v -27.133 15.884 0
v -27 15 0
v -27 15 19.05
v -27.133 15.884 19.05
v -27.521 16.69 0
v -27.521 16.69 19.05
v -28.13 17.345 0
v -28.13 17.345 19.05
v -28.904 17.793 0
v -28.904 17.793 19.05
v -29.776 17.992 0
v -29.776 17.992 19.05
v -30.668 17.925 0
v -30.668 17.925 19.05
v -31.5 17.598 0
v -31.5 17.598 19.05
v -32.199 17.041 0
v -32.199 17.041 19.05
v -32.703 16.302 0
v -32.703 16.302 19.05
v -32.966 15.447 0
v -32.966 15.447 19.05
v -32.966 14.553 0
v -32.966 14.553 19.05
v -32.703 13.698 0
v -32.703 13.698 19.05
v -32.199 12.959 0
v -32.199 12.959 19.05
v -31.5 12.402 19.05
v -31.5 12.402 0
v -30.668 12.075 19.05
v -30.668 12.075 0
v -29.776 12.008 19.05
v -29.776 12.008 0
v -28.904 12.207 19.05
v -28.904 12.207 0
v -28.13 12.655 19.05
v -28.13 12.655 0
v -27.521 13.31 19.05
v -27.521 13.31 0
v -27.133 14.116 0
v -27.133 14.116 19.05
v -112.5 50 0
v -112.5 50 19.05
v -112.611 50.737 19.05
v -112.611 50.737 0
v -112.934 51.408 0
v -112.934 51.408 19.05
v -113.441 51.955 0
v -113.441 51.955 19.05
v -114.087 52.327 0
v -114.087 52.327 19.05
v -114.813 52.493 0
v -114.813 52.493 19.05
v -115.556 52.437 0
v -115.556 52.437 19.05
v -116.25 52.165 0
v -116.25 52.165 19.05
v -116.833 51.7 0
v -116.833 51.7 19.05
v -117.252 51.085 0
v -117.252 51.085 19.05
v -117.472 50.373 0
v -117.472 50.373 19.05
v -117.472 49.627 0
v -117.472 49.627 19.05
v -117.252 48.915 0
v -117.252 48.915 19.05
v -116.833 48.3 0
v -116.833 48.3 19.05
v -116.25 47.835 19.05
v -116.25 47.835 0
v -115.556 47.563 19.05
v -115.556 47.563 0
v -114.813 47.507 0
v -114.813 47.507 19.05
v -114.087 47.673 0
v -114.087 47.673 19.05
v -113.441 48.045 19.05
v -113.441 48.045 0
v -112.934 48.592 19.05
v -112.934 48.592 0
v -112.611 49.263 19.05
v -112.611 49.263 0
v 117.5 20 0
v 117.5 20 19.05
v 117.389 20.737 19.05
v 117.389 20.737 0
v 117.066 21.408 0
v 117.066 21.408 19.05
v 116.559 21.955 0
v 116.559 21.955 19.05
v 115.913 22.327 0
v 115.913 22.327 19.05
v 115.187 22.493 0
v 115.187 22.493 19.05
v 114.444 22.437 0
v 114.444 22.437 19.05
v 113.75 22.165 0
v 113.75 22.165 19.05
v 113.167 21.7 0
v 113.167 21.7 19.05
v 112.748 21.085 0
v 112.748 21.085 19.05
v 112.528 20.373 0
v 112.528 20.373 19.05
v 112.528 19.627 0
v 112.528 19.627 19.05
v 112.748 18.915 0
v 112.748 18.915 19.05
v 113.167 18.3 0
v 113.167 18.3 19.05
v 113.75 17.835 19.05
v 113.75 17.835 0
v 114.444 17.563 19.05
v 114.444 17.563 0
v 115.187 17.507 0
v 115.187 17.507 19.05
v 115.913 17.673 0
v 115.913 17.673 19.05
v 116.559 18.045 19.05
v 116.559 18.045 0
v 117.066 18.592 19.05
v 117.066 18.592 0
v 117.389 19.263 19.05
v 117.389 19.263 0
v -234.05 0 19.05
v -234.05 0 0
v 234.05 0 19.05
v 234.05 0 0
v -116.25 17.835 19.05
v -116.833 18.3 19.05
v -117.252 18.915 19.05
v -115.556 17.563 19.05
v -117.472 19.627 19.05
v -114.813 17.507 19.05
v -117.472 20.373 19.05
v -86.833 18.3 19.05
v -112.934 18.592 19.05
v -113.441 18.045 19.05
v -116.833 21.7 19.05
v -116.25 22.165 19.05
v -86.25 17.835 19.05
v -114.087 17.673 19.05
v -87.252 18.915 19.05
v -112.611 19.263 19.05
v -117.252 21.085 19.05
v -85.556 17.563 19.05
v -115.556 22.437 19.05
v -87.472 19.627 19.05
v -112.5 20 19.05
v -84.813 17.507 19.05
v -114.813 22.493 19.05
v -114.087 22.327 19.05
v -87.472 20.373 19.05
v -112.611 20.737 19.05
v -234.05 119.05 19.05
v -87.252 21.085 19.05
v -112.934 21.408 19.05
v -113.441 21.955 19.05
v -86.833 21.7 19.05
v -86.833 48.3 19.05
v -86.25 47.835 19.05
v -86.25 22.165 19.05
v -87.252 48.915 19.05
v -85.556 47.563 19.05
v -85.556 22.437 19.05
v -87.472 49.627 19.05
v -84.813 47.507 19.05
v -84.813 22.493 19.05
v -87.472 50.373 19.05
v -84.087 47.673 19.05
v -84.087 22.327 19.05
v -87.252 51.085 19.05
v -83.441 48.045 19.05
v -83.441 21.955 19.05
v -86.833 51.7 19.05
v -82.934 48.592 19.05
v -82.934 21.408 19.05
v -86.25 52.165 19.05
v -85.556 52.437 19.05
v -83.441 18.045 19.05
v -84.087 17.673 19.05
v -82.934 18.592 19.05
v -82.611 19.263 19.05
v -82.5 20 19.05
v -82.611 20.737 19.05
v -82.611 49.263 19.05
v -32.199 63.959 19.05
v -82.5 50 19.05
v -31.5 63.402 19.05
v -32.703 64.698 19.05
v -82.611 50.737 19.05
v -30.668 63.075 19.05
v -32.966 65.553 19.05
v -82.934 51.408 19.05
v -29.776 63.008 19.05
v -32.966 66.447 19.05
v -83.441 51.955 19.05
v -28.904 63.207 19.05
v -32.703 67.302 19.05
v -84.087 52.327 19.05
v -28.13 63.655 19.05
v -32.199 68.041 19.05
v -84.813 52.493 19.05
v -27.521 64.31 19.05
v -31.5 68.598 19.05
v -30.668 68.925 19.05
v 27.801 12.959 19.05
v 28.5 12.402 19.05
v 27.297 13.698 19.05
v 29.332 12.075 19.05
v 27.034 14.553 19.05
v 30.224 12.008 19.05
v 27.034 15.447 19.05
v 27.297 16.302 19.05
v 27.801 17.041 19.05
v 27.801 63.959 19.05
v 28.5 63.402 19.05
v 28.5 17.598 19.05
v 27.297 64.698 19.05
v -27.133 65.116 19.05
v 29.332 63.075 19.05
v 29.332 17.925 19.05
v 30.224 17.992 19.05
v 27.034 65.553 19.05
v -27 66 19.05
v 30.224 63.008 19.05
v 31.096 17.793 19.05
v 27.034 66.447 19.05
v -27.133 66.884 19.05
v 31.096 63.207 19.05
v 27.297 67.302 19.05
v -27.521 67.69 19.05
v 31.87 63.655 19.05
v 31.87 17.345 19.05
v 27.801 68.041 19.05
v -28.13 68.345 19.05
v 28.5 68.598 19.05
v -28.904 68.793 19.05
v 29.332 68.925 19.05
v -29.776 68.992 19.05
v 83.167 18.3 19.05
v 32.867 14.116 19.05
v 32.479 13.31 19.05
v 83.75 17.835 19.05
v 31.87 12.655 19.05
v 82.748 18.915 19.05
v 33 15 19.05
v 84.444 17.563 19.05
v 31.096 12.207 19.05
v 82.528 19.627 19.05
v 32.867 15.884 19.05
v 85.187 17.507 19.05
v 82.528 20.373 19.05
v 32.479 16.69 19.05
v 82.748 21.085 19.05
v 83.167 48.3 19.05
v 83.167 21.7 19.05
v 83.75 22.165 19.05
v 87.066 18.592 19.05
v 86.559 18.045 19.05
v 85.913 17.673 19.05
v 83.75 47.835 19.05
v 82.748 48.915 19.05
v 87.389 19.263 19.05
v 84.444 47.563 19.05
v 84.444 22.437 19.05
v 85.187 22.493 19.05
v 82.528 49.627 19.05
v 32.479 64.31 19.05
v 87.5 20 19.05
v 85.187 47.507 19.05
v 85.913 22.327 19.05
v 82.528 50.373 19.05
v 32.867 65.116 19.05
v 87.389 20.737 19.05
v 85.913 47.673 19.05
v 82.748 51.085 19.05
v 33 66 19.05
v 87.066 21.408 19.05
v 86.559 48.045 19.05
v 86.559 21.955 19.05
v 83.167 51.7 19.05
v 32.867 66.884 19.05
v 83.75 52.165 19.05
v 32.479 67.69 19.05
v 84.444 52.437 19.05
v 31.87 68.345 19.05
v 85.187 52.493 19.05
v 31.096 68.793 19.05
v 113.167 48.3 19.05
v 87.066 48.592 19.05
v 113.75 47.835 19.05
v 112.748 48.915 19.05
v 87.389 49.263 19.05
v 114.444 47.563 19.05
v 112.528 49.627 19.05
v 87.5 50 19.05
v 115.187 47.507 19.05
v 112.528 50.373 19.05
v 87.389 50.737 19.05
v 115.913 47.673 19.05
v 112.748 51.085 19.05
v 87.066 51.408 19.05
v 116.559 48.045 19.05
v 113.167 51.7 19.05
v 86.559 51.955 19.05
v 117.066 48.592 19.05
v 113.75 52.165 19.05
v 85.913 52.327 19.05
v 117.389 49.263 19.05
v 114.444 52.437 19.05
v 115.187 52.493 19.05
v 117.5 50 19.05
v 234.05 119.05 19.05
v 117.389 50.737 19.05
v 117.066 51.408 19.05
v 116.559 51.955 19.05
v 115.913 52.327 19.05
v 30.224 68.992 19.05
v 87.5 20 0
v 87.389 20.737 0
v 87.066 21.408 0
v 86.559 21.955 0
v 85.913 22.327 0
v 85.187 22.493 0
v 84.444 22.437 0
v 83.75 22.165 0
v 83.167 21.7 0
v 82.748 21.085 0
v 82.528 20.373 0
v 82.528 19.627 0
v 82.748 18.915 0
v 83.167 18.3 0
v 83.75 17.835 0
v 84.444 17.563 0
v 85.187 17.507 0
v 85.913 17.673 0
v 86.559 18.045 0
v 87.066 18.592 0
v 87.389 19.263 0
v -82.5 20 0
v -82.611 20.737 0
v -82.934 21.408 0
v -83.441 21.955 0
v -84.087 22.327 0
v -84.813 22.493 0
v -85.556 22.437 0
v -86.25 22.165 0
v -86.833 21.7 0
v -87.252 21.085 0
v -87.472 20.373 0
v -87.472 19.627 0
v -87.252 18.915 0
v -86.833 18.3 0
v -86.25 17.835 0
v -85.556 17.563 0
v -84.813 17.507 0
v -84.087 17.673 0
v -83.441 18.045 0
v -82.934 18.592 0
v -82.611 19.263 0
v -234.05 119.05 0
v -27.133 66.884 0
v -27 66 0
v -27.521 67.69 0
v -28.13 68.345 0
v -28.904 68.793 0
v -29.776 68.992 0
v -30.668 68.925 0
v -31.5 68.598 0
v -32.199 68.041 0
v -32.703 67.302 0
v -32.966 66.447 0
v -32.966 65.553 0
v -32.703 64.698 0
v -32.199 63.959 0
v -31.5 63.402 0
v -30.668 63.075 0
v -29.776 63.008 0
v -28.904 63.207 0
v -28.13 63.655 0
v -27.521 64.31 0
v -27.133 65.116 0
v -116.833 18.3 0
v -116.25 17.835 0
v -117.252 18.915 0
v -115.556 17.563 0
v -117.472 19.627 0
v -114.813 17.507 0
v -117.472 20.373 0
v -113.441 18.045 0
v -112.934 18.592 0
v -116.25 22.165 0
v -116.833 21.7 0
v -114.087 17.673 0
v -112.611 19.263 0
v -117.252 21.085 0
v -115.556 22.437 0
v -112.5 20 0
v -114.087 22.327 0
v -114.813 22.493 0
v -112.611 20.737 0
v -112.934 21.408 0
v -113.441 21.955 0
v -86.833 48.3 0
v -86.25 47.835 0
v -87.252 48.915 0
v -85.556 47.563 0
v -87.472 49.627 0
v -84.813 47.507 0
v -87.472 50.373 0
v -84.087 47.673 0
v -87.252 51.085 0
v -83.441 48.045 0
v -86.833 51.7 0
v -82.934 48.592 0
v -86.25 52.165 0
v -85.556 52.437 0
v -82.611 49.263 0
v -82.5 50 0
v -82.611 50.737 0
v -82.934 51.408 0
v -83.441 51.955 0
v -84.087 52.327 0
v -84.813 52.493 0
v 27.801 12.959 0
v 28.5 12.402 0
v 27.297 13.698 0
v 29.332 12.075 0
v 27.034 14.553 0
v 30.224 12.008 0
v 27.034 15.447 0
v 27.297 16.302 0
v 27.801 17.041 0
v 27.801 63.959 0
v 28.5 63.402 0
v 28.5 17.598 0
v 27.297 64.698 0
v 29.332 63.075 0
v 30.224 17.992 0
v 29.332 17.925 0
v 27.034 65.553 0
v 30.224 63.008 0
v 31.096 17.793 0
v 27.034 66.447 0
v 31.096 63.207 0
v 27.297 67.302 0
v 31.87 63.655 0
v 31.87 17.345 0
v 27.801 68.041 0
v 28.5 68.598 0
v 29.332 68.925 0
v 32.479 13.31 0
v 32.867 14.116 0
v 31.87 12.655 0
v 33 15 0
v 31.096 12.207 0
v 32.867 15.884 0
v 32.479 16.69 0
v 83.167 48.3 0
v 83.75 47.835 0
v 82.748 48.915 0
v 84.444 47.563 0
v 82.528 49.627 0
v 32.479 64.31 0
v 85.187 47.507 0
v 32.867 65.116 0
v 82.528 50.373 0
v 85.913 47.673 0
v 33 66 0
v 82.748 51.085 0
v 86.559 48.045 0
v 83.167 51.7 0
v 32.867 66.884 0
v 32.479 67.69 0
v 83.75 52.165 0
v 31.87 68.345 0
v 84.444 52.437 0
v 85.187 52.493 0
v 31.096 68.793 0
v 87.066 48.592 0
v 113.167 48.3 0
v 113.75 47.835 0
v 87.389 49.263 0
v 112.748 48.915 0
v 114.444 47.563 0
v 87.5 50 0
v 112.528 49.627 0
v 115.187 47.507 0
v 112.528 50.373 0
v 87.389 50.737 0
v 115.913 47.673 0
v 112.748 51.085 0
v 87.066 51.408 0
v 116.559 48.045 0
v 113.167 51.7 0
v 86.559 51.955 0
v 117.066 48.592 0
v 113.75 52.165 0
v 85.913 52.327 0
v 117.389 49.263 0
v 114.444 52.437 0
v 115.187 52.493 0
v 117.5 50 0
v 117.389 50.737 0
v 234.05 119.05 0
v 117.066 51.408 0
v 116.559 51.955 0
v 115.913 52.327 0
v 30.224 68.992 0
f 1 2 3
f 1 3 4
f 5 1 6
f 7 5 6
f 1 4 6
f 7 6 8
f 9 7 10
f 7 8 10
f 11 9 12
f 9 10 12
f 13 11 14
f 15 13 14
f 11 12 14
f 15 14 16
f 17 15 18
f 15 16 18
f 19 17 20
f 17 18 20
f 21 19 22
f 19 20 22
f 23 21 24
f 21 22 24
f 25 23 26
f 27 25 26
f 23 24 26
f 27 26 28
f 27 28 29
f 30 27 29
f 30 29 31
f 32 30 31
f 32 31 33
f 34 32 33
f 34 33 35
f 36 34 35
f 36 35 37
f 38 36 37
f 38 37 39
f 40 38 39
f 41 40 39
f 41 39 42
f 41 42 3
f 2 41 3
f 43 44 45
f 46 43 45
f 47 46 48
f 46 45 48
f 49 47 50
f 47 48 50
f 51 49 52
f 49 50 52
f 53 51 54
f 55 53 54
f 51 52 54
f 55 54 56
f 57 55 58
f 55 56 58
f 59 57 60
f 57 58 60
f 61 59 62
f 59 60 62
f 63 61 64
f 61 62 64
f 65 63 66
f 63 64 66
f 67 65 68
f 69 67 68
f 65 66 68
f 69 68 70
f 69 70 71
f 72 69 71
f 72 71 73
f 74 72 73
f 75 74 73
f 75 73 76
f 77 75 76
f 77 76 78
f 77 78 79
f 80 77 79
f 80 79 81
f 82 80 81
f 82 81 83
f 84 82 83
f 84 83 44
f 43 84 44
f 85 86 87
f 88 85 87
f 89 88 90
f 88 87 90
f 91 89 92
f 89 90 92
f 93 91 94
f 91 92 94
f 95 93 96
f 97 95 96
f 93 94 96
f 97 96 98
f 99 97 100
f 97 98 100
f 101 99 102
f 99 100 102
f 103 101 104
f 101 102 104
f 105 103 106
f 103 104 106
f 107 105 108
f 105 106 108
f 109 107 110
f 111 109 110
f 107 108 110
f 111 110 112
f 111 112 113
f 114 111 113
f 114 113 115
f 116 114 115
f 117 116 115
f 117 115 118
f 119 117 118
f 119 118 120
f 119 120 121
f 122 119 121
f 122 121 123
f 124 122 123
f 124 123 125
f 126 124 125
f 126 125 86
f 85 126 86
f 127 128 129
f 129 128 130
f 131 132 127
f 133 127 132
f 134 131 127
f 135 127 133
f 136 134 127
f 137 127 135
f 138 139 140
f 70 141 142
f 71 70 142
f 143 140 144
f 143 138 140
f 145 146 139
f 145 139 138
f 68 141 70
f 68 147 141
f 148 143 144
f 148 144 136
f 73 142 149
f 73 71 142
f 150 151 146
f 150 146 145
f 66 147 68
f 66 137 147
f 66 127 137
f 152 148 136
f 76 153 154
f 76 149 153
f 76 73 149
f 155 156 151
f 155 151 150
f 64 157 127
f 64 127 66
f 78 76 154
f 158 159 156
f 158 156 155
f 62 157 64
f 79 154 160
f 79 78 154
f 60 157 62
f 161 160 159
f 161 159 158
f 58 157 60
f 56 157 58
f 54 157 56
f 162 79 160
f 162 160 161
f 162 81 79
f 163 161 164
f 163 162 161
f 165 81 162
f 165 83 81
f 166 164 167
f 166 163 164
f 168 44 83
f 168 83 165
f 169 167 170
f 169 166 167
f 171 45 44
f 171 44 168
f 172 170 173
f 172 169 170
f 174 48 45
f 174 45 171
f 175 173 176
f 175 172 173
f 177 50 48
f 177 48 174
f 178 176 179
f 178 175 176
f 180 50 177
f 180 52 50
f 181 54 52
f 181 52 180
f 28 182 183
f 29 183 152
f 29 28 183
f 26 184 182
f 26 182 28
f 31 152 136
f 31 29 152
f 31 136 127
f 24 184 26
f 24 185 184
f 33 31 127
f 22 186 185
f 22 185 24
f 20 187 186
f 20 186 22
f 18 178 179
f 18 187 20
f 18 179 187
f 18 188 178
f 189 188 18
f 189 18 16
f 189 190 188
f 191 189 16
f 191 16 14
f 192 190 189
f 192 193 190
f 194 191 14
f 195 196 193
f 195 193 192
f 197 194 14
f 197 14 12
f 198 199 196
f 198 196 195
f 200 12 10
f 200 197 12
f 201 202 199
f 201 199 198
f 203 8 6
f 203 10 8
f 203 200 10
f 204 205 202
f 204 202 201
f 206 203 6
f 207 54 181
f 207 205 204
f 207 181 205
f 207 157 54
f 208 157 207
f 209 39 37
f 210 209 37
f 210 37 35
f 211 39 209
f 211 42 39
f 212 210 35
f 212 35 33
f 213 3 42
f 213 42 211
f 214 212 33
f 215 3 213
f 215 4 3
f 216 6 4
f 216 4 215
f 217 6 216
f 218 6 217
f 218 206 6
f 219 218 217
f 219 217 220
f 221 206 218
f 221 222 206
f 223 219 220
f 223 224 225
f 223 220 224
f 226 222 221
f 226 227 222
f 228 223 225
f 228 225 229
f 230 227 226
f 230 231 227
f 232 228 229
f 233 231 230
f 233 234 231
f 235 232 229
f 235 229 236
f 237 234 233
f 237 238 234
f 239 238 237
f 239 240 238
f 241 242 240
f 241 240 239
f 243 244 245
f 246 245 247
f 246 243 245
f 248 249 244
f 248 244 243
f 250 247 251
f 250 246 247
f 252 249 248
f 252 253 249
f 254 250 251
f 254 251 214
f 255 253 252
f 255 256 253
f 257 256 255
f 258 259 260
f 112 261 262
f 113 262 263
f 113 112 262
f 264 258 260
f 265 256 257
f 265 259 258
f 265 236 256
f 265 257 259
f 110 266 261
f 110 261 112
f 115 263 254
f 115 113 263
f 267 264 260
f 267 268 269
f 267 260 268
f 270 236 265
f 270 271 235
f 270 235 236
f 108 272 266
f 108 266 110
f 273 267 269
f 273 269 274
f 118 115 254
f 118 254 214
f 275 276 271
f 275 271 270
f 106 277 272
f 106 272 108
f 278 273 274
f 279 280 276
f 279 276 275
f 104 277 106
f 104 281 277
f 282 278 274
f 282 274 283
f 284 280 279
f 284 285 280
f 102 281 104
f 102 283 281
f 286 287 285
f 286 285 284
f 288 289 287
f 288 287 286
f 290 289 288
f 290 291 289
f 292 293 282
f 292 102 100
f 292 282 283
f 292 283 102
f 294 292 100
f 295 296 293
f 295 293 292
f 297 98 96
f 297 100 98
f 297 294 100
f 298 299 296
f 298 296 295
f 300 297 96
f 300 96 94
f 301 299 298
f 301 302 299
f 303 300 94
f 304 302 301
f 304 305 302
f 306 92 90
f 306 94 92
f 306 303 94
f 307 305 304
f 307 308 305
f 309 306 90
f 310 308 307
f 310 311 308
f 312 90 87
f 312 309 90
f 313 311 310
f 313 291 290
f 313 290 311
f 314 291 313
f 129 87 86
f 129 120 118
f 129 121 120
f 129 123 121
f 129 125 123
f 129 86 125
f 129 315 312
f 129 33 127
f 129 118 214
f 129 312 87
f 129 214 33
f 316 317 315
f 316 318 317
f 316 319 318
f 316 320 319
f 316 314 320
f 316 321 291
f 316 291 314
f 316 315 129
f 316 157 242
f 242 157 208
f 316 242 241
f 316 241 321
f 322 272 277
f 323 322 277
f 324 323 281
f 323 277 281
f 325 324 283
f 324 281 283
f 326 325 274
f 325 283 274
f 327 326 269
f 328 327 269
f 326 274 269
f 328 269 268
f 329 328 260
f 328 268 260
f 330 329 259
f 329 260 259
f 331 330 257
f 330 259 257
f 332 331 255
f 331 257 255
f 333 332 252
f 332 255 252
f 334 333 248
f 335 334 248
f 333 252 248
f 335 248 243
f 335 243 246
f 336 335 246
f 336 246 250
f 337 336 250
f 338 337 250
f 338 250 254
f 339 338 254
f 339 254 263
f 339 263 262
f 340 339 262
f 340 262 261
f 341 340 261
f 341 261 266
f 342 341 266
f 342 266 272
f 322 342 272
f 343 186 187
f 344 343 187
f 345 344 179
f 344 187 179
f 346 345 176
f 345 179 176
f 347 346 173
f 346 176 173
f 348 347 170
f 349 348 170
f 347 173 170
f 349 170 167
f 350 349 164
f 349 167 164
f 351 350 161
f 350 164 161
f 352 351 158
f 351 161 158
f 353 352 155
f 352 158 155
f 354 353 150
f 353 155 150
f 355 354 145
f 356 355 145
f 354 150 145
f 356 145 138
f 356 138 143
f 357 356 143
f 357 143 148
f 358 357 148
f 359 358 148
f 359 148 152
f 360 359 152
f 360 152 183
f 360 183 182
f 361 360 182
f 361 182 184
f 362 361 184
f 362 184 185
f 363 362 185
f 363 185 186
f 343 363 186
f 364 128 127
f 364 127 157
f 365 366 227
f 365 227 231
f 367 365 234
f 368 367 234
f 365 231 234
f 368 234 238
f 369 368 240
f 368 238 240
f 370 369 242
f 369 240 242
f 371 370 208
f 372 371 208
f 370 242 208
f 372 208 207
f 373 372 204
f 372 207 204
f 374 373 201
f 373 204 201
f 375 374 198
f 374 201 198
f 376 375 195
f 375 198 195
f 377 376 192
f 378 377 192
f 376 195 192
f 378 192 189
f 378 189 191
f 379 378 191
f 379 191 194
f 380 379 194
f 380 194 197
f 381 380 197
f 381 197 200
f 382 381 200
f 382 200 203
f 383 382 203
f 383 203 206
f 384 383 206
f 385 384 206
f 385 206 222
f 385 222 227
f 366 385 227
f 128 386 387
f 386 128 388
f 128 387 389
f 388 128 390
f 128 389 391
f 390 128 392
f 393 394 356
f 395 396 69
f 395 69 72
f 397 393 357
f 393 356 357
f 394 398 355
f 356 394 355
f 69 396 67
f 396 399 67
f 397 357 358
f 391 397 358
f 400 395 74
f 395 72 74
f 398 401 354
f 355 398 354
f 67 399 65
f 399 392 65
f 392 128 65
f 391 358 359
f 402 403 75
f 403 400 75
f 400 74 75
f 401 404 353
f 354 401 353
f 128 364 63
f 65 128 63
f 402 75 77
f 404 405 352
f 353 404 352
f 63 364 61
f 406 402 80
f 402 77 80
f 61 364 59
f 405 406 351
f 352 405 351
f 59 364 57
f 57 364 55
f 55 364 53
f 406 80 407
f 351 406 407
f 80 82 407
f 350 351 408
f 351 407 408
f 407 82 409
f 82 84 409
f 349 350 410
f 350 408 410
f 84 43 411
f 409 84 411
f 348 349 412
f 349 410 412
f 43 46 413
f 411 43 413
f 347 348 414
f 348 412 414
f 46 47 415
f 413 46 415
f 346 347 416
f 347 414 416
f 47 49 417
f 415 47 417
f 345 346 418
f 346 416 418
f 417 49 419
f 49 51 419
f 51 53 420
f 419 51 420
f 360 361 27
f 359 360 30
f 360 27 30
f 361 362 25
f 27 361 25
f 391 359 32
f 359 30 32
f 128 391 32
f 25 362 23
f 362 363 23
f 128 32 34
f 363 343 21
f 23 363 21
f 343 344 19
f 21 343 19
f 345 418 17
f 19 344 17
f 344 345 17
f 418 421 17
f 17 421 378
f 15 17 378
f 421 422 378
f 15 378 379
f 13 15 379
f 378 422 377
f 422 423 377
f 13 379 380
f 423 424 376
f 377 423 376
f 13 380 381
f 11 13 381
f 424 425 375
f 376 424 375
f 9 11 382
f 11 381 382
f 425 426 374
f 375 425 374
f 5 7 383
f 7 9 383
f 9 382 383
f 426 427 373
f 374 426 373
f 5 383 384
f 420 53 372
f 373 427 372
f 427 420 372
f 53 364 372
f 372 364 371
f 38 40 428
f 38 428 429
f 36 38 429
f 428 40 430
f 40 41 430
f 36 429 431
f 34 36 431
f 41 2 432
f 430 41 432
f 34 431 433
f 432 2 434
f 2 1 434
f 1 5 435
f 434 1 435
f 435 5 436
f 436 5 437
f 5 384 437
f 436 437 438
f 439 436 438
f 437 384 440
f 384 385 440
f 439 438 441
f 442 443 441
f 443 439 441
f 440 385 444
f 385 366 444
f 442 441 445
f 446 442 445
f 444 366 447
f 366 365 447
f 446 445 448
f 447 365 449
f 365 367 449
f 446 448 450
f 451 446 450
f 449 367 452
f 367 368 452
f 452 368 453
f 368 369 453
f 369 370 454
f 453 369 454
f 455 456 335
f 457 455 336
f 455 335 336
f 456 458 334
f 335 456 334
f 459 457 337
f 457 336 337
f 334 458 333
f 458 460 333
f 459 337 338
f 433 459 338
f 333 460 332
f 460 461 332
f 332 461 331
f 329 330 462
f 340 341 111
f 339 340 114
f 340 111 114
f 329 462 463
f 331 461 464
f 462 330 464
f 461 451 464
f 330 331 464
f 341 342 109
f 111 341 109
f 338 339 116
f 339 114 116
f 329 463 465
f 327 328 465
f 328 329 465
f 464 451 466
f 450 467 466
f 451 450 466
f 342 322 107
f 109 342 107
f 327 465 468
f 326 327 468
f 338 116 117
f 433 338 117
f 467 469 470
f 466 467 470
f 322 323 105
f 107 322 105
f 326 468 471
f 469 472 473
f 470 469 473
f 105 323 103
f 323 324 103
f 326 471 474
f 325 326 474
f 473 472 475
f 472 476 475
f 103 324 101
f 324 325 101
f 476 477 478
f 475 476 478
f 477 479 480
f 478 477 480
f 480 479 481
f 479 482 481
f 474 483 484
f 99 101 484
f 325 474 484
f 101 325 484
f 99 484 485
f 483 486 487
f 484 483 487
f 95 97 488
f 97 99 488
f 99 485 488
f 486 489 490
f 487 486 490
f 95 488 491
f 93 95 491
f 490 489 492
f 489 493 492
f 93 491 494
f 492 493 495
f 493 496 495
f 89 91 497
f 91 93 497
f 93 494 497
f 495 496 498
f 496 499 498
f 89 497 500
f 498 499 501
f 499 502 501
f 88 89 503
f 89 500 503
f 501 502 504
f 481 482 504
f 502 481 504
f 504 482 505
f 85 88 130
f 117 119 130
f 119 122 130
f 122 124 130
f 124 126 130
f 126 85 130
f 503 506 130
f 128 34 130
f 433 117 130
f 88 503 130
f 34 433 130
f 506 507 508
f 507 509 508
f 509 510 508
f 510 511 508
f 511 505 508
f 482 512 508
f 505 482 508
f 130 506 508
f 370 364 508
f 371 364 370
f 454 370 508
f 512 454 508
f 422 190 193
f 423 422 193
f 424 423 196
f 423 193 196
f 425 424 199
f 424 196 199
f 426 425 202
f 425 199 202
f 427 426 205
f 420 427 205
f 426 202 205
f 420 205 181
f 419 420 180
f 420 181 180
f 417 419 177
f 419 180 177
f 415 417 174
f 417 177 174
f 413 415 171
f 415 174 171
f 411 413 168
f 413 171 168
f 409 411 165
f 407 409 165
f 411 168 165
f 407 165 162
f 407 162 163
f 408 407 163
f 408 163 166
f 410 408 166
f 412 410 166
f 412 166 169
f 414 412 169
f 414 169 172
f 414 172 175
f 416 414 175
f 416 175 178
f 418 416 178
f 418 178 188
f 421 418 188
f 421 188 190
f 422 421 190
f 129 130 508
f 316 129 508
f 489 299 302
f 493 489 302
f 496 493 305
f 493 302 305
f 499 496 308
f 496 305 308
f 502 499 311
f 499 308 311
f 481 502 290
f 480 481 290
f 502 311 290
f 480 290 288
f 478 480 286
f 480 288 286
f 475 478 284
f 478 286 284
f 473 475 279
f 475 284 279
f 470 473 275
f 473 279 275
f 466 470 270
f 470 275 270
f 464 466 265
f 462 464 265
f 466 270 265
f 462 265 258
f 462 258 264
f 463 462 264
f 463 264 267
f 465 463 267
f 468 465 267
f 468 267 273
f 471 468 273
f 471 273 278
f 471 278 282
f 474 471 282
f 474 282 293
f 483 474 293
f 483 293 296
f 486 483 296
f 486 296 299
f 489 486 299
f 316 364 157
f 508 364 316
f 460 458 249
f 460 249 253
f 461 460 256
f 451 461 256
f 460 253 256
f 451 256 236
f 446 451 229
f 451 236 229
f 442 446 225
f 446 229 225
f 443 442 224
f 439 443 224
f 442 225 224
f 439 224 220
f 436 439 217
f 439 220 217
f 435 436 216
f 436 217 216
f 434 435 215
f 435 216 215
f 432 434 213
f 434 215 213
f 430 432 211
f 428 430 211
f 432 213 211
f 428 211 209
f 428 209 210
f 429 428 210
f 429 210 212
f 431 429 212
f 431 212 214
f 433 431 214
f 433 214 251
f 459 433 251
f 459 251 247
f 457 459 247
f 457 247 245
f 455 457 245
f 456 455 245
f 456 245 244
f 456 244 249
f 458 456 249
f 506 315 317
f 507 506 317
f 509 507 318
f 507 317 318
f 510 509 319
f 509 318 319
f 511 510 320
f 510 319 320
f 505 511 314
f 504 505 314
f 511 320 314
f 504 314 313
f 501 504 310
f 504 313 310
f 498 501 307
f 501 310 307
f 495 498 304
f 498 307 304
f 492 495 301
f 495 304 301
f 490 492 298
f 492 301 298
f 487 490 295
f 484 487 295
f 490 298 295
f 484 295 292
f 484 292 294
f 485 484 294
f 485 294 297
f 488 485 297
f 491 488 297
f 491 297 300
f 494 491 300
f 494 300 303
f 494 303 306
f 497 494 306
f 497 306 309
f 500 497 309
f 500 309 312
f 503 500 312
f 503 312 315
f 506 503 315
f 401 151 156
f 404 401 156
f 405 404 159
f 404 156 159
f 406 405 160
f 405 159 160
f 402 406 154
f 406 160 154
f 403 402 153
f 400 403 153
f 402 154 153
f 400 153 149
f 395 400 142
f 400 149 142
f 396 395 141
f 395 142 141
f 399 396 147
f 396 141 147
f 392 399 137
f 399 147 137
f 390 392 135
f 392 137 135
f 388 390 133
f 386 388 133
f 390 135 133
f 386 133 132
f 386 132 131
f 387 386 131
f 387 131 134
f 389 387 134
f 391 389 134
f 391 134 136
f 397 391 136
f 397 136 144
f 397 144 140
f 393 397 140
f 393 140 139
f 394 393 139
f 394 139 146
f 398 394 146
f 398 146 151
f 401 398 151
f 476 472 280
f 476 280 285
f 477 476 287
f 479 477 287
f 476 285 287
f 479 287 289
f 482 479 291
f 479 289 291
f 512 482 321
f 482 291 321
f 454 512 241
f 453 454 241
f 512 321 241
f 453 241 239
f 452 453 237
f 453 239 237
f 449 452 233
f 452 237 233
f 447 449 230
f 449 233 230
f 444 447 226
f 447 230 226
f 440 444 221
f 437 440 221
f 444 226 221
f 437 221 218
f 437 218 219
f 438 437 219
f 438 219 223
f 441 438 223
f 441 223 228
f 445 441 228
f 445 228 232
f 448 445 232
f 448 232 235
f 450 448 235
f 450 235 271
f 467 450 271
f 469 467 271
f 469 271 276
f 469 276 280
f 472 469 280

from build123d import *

# Parameters (mm, degrees)
SKETCH1_W                = 468.1
SKETCH1_H                = 119.05
BOSS_EXTRUDE1_DEPTH      = 19.05
M5_CLEARANCE_HOLE1_D     = 5
M5_CLEARANCE_HOLE1_DEPTH = 28.497848452
M5_CLEARANCE_HOLE1_TIP   = 1.502151548
M5_CLEARANCE_HOLE2_D     = 6
M5_CLEARANCE_HOLE2_DEPTH = 28.197418143
M5_CLEARANCE_HOLE2_TIP   = 1.802581857


with BuildPart() as part:
    # Sketch1 → Boss-Extrude1 (new body)
    with BuildSketch(Plane.XY):
        with Locations((0, 59.525)):
            Rectangle(SKETCH1_W, SKETCH1_H)
    extrude(amount=BOSS_EXTRUDE1_DEPTH)

    # M5 Clearance Hole1
    with Locations(Plane(origin=(0, 0, 0), x_dir=(-1, 0, 0), z_dir=(0, 0, -1))):
        with Locations((-115, 20), (-115, 50), (-85, 50), (-85, 20), (85, 20), (85, 50), (115, 50), (115, 20)):
            Hole(M5_CLEARANCE_HOLE1_D / 2, depth=M5_CLEARANCE_HOLE1_DEPTH)
            with Locations((0, 0, -(M5_CLEARANCE_HOLE1_DEPTH + M5_CLEARANCE_HOLE1_TIP / 2))):  # 118° drill point
                Cone(0, M5_CLEARANCE_HOLE1_D / 2, M5_CLEARANCE_HOLE1_TIP, mode=Mode.SUBTRACT)

    # M5 Clearance Hole2
    with Locations(Plane(origin=(0, 0, 0), x_dir=(-1, 0, 0), z_dir=(0, 0, -1))):
        with Locations((30, 15), (30, 66), (-30, 15), (-30, 66)):
            Hole(M5_CLEARANCE_HOLE2_D / 2, depth=M5_CLEARANCE_HOLE2_DEPTH)
            with Locations((0, 0, -(M5_CLEARANCE_HOLE2_DEPTH + M5_CLEARANCE_HOLE2_TIP / 2))):  # 118° drill point
                Cone(0, M5_CLEARANCE_HOLE2_D / 2, M5_CLEARANCE_HOLE2_TIP, mode=Mode.SUBTRACT)


solid = part.part
